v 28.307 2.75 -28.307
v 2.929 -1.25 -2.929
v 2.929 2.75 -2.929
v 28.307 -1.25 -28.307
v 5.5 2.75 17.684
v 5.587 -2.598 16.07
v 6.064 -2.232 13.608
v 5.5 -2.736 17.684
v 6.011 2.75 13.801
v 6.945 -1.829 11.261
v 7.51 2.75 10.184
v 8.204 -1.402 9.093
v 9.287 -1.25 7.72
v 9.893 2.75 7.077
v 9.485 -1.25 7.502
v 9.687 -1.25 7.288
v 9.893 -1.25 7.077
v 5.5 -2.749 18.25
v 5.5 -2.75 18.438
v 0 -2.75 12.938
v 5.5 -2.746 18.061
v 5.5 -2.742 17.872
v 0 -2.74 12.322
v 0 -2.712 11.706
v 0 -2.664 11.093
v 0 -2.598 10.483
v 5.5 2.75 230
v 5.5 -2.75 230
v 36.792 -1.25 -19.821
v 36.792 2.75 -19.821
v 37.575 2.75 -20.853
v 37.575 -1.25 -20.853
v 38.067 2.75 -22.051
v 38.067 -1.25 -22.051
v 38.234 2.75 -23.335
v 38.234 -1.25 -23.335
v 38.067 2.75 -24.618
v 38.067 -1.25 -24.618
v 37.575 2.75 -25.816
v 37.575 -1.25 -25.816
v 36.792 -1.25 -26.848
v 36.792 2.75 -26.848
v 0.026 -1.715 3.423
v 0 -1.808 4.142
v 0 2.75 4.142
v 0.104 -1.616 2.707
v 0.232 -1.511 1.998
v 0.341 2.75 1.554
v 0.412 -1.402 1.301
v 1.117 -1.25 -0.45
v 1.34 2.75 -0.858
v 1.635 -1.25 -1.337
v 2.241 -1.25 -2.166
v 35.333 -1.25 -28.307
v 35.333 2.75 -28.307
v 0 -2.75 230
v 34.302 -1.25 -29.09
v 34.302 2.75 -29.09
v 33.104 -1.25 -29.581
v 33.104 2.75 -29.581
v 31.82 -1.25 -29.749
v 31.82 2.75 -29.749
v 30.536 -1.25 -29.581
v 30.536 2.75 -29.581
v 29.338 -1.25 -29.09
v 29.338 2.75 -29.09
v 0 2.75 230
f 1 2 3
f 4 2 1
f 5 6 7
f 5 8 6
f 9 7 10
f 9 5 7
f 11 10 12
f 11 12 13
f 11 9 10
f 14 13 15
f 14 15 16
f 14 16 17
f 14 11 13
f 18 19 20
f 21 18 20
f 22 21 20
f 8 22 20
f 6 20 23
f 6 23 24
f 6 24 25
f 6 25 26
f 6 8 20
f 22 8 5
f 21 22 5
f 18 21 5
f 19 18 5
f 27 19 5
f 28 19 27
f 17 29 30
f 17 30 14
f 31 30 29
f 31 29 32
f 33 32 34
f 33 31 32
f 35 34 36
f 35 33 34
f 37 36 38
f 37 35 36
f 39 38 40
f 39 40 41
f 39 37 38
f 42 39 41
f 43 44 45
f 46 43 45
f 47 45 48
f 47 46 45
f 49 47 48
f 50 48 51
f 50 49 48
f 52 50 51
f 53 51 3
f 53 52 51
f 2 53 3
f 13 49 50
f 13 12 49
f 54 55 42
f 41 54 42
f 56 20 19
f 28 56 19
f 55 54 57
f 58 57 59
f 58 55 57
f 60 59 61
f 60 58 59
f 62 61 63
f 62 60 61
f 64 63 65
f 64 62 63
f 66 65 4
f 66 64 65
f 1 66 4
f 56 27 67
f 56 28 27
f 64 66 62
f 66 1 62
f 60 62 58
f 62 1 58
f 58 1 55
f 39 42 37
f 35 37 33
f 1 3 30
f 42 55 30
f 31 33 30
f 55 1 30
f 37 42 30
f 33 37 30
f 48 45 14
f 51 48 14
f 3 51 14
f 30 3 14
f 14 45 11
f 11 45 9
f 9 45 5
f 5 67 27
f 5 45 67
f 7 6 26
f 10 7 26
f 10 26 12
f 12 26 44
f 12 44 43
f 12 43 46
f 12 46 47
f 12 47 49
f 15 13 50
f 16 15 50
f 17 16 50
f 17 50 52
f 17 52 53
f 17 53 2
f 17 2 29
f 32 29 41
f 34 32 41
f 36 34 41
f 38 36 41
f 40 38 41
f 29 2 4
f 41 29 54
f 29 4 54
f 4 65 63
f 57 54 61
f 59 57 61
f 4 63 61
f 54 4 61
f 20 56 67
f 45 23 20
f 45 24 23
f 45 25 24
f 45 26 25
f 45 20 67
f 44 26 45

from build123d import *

# Parameters (mm, degrees)
F1_DEPTH    = 2.75
F2_T1_DEPTH = 30.499500005
F3_R        = 10
F6_DEPTH    = 31.7539349198
F7_R        = 15
F8_R        = 10


# Not quite as in the source:
# - a fillet or chamfer that OpenCascade refuses, or shapes differently, is made with other operations: its cross-section is extruded or revolved along the edge and cut away or added


with BuildPart() as f1:
    # F0 (on Front) → F1 (new body, symmetric)
    with BuildSketch(Plane.XZ):
        Polygon((0, 230), (0, 0), (31.8198051534, -31.8198051534), (40.3050865276, -23.3345237792), (5.5, 11.4705627485), (5.5, 230), align=None)
    extrude(amount=F1_DEPTH, both=True)

    # F2: fillet of radius 5 on 2 edges, made by hand

    # F2_s2 → F2_t1 (cut)
    with BuildSketch(Plane.XZ.offset(-15.2497500025)):
        with BuildLine():
            ThreePointArc((35.3553390593, -28.2844126688), (31.8198051534, -29.7488787629), (28.2842712475, -28.2844126688))
            Line((28.2842712475, -28.2844126688), (28.2135605693, -28.3551233469))
            ThreePointArc((28.2135605693, -28.3551233469), (29.9813628776, -30.1227842339), (31.7490944753, -31.8905158315))
            Line((31.7490944753, -31.8905158315), (31.8905158315, -31.8905158315))
            ThreePointArc((31.8905158315, -31.8905158315), (33.6582474291, -30.1227842339), (35.4260497374, -28.3551233469))
            Line((35.4260497374, -28.3551233469), (35.3553390593, -28.2844126688))
        make_face()
        with BuildLine():
            ThreePointArc((36.7696940431, -19.7989898732), (38.2341601371, -23.3345237792), (36.7696940431, -26.8700576851))
            Line((36.7696940431, -26.8700576851), (36.8404047212, -26.9407683632))
            ThreePointArc((36.8404047212, -26.9407683632), (38.6080656081, -25.1729660549), (40.3757972058, -23.4052344573))
            Line((40.3757972058, -23.4052344573), (40.3757972058, -23.263813101))
            ThreePointArc((40.3757972058, -23.263813101), (38.6080656081, -21.4960815034), (36.8404047212, -19.7282791951))
            Line((36.8404047212, -19.7282791951), (36.7696940431, -19.7989898732))
        make_face()
    extrude(amount=F2_T1_DEPTH, mode=Mode.SUBTRACT)

    # F3
    f3_edges = [f1.edges().sort_by_distance(p)[0] for p in [
        (0, 0, 0),
    ]]
    fillet(f3_edges, radius=F3_R)

    # F5 (on offset) → F6 (cut)
    with BuildSketch(Plane(origin=(0, 0, 0), x_dir=(0.7071067812, 0, -0.7071067812), z_dir=(-0.7071067812, 0, -0.7071067812))):
        Polygon((40, 2.75), (-8.2739908248, 2.75), (0.2329319046, 1.25), (45, 1.25), (45, 2.75), align=None)
    extrude(amount=-F6_DEPTH, mode=Mode.SUBTRACT)

    # F7
    f7_edges = [f1.edges().sort_by_distance(p)[0] for p in [
        (5.5, 0.357253, 11.470563),
    ]]
    fillet(f7_edges, radius=F7_R)

    # F8
    f8_edges = [f1.edges().sort_by_distance(p)[0] for p in [
        (2.753762, -2.75, 14.454952),
        (4.725257, -1.25, 4.395842),
    ]]
    fillet(f8_edges, radius=F8_R)


solid = f1.part
